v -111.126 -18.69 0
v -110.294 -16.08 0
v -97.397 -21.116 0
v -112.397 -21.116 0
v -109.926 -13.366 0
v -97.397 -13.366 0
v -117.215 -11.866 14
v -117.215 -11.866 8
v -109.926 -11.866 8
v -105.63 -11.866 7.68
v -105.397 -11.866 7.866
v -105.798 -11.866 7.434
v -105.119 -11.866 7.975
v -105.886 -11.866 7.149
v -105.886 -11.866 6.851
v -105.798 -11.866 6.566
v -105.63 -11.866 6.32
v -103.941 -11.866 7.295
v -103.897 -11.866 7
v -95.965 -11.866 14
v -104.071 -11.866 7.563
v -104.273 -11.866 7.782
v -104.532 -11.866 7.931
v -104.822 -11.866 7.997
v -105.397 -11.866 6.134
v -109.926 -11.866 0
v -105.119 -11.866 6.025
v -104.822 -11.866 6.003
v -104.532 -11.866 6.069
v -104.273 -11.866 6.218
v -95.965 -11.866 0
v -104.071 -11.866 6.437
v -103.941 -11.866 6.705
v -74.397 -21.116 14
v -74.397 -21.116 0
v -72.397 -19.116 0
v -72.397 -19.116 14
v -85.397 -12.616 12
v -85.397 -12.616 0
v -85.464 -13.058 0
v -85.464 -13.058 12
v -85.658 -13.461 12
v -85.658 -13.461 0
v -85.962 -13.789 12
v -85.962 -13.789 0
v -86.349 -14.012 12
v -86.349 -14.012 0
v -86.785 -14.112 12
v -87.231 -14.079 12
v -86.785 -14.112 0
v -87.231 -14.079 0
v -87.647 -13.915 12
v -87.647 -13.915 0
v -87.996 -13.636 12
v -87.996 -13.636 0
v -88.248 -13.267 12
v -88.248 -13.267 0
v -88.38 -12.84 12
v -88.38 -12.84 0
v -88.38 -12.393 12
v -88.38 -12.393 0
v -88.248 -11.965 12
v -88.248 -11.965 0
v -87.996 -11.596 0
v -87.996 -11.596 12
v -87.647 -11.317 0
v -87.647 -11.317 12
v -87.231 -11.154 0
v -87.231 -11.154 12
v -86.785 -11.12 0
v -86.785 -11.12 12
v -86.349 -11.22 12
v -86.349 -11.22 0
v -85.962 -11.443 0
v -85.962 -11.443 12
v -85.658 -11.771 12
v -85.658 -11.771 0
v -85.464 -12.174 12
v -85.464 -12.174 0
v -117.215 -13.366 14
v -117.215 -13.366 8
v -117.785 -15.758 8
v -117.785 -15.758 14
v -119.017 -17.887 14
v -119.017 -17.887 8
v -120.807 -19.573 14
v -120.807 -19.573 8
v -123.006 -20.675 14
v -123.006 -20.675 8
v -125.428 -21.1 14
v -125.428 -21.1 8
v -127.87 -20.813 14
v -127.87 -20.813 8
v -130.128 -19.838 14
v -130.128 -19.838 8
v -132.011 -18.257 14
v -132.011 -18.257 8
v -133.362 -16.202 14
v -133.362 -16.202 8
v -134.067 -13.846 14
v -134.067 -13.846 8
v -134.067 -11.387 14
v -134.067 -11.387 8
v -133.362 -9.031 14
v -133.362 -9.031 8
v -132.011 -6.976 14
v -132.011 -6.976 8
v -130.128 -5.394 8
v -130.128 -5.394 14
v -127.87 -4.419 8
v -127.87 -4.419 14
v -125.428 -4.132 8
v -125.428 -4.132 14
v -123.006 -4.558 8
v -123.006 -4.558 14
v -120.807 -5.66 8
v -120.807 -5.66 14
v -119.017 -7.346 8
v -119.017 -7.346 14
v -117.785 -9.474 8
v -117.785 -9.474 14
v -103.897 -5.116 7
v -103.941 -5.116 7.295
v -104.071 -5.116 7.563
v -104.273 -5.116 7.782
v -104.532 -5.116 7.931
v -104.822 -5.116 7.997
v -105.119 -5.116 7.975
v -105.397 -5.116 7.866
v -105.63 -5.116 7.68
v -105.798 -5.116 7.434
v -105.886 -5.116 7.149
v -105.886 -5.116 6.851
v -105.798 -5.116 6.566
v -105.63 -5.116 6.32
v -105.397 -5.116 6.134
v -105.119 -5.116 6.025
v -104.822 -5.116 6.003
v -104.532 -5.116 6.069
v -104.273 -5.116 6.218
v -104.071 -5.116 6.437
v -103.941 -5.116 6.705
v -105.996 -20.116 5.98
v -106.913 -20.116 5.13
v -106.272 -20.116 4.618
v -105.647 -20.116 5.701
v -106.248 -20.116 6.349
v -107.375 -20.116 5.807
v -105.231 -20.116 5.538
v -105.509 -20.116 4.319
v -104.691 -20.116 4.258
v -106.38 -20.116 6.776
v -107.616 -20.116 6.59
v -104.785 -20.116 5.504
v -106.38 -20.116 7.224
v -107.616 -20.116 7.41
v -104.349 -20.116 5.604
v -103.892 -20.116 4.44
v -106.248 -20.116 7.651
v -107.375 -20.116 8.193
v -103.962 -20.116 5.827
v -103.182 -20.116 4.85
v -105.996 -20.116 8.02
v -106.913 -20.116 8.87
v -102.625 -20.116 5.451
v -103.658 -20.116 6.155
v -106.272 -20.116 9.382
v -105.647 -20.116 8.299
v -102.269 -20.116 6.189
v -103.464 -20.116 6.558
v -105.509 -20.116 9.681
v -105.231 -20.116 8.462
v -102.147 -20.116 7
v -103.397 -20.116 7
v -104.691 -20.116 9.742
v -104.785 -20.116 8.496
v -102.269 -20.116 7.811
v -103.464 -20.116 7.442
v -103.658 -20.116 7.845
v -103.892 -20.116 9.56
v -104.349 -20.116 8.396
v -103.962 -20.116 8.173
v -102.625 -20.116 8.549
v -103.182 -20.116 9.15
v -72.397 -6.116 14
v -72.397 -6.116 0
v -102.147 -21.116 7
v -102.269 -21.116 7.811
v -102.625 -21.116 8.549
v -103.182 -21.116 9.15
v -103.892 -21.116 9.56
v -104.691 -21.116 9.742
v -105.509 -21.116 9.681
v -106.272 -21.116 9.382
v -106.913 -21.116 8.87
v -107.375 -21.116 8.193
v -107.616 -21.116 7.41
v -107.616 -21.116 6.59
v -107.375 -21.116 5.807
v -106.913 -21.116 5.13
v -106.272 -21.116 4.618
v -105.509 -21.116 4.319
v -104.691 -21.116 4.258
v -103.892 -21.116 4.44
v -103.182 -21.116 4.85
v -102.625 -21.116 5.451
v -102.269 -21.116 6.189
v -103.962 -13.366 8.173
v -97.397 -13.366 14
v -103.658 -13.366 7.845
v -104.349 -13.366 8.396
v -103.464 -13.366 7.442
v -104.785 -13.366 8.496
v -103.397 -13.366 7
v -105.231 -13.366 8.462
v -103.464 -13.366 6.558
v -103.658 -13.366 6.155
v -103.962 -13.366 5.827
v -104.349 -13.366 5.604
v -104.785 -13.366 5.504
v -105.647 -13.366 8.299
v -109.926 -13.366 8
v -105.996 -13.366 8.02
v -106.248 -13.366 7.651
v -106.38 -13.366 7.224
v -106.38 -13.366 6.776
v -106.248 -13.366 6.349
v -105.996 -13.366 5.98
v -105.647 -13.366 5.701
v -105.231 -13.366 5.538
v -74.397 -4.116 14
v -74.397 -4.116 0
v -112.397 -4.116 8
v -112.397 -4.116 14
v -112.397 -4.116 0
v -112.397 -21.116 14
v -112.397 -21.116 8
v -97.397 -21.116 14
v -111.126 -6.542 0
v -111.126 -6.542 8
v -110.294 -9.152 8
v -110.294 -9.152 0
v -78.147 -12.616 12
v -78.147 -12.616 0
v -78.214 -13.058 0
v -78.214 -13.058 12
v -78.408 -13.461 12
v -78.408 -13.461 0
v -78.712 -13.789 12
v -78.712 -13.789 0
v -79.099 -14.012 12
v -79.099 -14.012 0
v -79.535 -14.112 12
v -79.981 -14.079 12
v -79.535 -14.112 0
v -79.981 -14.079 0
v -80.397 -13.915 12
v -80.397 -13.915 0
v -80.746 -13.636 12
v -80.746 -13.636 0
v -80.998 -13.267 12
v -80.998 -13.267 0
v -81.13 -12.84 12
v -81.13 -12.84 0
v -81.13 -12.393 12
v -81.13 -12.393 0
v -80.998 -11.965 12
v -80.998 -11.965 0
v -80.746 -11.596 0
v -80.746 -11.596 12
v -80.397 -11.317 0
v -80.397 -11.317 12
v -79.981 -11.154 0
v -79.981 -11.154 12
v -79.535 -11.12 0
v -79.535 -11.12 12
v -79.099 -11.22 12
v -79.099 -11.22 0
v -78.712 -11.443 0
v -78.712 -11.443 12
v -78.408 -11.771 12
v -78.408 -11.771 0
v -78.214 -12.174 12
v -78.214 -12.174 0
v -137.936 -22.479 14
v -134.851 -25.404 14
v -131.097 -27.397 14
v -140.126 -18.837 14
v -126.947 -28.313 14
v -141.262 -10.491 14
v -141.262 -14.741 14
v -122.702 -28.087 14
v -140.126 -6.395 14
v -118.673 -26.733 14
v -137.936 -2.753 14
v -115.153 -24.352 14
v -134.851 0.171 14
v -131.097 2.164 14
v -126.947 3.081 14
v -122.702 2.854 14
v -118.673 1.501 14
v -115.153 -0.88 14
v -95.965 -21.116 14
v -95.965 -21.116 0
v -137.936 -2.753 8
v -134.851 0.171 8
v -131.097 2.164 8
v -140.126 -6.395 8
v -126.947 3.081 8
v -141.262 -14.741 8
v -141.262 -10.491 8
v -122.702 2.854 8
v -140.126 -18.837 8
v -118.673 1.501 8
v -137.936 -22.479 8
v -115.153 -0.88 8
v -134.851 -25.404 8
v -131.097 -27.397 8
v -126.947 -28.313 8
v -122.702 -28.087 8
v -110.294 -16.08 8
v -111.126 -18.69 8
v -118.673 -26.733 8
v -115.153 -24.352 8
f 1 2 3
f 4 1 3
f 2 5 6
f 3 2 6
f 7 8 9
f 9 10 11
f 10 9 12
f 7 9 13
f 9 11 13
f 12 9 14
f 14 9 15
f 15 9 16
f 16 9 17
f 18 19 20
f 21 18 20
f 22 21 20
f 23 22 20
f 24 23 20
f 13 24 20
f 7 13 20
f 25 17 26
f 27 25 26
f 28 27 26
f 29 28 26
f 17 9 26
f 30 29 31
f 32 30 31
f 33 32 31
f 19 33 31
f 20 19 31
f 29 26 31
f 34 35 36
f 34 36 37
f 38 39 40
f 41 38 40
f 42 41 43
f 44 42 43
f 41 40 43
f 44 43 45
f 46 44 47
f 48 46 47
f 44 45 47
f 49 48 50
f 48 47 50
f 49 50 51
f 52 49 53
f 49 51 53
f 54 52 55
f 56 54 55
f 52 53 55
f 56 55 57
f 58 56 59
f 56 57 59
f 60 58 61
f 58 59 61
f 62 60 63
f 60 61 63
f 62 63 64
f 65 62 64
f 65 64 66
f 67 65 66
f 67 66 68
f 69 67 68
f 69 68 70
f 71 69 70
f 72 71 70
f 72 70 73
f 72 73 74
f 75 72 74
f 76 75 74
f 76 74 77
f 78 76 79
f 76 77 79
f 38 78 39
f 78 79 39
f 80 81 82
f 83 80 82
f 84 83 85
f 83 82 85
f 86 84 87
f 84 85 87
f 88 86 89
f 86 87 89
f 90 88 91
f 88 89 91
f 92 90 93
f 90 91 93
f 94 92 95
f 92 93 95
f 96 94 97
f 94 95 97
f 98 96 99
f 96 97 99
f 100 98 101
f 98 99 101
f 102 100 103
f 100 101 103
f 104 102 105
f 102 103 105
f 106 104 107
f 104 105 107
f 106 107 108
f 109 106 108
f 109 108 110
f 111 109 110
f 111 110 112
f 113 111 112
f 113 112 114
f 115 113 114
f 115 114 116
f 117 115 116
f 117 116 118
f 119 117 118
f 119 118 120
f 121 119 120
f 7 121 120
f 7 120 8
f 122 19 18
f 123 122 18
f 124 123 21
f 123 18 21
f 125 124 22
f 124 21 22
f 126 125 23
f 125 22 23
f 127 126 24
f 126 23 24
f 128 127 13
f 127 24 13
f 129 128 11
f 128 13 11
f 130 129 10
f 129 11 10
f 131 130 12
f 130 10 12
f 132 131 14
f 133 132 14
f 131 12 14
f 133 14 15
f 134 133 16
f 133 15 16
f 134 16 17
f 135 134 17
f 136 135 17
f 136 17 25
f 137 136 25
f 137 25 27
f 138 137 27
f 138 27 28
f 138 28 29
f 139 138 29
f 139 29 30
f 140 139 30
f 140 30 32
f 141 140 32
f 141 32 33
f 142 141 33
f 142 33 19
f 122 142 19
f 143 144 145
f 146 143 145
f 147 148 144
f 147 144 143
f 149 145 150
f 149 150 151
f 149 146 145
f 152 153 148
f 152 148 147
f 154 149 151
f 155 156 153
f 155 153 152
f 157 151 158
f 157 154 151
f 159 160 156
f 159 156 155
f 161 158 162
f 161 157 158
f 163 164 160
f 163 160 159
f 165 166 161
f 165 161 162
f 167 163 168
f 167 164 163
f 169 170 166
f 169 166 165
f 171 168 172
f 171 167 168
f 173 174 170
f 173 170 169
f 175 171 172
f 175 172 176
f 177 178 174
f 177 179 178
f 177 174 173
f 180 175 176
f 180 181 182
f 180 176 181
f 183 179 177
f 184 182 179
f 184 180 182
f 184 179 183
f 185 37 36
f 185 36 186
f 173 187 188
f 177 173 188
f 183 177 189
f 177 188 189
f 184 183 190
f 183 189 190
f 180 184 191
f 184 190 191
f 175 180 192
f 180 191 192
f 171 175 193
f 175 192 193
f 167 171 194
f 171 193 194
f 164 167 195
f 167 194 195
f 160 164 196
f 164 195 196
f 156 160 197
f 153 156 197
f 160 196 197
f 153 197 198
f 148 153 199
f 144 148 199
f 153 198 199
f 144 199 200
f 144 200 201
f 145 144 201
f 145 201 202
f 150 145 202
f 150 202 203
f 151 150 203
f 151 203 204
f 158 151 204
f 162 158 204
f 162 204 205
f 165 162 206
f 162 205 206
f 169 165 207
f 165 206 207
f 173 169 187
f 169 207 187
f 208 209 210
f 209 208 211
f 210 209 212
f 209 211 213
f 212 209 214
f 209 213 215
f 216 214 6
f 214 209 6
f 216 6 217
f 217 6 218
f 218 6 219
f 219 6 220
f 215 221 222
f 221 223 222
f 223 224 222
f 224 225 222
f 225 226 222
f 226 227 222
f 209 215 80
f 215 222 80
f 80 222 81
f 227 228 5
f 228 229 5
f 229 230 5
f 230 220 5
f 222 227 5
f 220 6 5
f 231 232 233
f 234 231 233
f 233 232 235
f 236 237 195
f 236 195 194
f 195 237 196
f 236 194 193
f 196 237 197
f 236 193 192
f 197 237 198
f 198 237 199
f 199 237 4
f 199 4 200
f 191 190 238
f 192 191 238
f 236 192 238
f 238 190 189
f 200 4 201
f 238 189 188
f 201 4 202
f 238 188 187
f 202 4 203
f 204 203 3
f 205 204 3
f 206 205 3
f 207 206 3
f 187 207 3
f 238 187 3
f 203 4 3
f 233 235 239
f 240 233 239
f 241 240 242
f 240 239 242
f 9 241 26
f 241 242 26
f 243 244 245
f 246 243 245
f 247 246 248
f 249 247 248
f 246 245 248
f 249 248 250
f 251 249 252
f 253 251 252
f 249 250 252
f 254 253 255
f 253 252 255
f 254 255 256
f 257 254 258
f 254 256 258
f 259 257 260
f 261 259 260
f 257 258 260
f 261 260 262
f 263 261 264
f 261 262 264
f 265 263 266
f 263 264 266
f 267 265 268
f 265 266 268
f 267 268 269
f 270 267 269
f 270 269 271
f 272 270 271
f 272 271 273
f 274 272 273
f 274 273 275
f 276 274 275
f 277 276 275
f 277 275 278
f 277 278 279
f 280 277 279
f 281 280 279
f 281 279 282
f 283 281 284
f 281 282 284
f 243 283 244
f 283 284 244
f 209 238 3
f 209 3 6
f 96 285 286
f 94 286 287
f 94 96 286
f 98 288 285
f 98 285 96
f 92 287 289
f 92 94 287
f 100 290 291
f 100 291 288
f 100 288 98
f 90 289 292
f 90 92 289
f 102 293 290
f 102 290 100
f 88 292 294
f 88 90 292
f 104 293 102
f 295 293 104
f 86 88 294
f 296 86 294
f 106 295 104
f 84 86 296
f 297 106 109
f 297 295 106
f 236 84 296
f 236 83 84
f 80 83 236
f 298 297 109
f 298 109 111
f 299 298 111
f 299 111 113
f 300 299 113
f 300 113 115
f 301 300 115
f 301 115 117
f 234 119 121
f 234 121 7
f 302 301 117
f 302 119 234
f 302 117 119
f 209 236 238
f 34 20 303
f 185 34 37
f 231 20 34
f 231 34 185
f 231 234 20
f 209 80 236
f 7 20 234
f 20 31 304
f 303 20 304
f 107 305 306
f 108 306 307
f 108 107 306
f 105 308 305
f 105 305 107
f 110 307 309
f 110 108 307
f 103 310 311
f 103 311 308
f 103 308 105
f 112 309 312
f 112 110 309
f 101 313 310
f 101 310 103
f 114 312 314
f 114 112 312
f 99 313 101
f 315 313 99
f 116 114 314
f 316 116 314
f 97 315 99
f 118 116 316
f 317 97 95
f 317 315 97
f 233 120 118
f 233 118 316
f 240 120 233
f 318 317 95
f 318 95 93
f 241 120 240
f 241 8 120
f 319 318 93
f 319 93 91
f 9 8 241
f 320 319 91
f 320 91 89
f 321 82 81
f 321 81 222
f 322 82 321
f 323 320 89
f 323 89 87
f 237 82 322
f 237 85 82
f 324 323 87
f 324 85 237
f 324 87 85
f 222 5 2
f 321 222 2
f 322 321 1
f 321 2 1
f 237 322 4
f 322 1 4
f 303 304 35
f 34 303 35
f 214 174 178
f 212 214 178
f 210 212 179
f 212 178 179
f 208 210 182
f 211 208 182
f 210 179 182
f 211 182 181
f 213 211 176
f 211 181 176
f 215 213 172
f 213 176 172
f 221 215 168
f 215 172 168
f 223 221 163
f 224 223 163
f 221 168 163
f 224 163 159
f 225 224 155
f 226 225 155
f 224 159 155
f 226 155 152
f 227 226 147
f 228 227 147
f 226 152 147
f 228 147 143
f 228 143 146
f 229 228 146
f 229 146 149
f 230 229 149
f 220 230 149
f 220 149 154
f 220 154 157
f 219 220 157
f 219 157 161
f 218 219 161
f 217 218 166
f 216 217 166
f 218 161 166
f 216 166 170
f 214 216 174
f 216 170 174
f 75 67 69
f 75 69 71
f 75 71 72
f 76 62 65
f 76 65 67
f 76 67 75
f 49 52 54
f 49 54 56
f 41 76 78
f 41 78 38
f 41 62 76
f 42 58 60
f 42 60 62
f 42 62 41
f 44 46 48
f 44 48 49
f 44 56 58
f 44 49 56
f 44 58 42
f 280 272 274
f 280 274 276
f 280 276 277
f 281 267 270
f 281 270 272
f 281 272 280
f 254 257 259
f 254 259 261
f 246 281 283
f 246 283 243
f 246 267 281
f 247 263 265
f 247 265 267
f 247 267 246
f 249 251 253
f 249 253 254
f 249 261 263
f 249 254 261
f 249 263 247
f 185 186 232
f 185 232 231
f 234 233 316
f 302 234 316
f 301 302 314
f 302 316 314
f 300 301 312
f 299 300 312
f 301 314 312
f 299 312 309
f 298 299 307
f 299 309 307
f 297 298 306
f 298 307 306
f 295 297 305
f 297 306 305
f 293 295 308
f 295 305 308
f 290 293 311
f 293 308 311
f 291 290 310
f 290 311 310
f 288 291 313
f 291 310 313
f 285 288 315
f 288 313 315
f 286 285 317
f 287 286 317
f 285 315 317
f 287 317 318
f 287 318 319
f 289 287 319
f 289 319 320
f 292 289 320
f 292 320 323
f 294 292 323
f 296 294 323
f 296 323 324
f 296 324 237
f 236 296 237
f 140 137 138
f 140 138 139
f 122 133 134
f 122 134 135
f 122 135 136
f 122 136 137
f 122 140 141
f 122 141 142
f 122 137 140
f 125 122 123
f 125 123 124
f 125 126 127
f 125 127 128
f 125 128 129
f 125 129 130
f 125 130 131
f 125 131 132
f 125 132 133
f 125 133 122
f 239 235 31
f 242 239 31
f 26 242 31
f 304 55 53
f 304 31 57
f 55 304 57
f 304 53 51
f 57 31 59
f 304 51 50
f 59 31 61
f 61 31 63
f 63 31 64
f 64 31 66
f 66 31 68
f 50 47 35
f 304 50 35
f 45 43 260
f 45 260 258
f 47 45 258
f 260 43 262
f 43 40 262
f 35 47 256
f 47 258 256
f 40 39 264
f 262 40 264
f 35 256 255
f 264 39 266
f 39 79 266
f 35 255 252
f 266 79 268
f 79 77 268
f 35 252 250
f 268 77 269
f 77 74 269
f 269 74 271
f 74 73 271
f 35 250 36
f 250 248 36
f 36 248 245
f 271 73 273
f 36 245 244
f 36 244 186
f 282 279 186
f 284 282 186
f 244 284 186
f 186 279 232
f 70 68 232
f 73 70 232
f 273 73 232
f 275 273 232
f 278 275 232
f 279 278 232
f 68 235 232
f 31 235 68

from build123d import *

# Parameters (mm, degrees)
F1_DEPTH  = 14
F2_R      = 2.75
F3_DEPTH  = 1
F4_R      = 1.5
F5_DEPTH  = 6.75
F6_R      = 1
F7_DEPTH  = 15
F9_DEPTH  = 8
F10_R     = 1.5
F11_DEPTH = 12
F12_SIZE  = 2


with BuildPart() as f1:
    # F0 (on Top) → F1 (new body)
    with BuildSketch(Plane.XY):
        with BuildLine():
            Line((-72.3968957005, -4.1161350385), (-112.3968957005, -4.1161350385))
            ThreePointArc((-112.3968957005, -4.1161350385), (-141.4063263067, -12.6161350385), (-112.3968957005, -21.1161350385))
            Line((-112.3968957005, -21.1161350385), (-97.3968957005, -21.1161350385))
            Line((-97.3968957005, -21.1161350385), (-97.3968957005, -13.3661350385))
            Line((-97.3968957005, -13.3661350385), (-117.2151498361, -13.3661350385))
            ThreePointArc((-117.2151498361, -13.3661350385), (-134.1563263067, -12.6161350385), (-117.2151498361, -11.8661350385))
            Line((-117.2151498361, -11.8661350385), (-95.9651498361, -11.8661350385))
            Line((-95.9651498361, -11.8661350385), (-95.9651498361, -21.1161350385))
            Line((-95.9651498361, -21.1161350385), (-72.3968957005, -21.1161350385))
            Line((-72.3968957005, -21.1161350385), (-72.3968957005, -4.1161350385))
        make_face()
    extrude(amount=F1_DEPTH)

    # F2 (on face) → F3 (cut)
    with BuildSketch(Plane.XZ.offset(21.1161350386)):
        with Locations((-104.8968957005, 7)):
            Circle(F2_R)
    extrude(amount=-F3_DEPTH, mode=Mode.SUBTRACT)

    # F4 (on face) → F5 (cut, through all)
    with BuildSketch(Plane.XZ.offset(20.1161350386)):
        with Locations((-104.8968957005, 7)):
            Circle(F4_R)
    extrude(amount=-F5_DEPTH, mode=Mode.SUBTRACT)

    # F6 (on face) → F7 (cut)
    with BuildSketch(Plane.XZ.offset(20.1161350386)):
        with Locations((-104.8968957005, 7)):
            Circle(F6_R)
    extrude(amount=-F7_DEPTH, mode=Mode.SUBTRACT)

    # F8 (on face) → F9 (cut)
    with BuildSketch(Plane(origin=(0, 0, 0), x_dir=(1, 0, 0), z_dir=(0, 0, -1))):
        with BuildLine():
            ThreePointArc((-109.9262055214, 13.3661350385), (-110.6529561162, 17.403274319), (-112.3968957005, 21.1161350385))
            ThreePointArc((-112.3968957005, 21.1161350385), (-141.4063263067, 12.6161350385), (-112.3968957005, 4.1161350385))
            ThreePointArc((-112.3968957005, 4.1161350385), (-110.6529561162, 7.8289957581), (-109.9262055214, 11.8661350385))
            Line((-109.9262055214, 11.8661350385), (-117.2151498361, 11.8661350385))
            ThreePointArc((-117.2151498361, 11.8661350385), (-134.1563263067, 12.6161350385), (-117.2151498361, 13.3661350385))
            Line((-117.2151498361, 13.3661350385), (-109.9262055214, 13.3661350385))
        make_face()
    extrude(amount=-F9_DEPTH, mode=Mode.SUBTRACT)

    # F10 (on face) → F11 (cut)
    with BuildSketch(Plane(origin=(0, 0, 0), x_dir=(1, 0, 0), z_dir=(0, 0, -1))):
        with Locations((-79.6468957005, 12.6161350385)):
            Circle(F10_R)
        with Locations((-86.8968957005, 12.6161350385)):
            Circle(F10_R)
    extrude(amount=-F11_DEPTH, mode=Mode.SUBTRACT)

    # F12
    f12_edges = [f1.edges().sort_by_distance(p)[0] for p in [
        (-72.396896, -4.116135, 7),
        (-72.396896, -21.116135, 7),
    ]]
    chamfer(f12_edges, length=F12_SIZE)


solid = f1.part
